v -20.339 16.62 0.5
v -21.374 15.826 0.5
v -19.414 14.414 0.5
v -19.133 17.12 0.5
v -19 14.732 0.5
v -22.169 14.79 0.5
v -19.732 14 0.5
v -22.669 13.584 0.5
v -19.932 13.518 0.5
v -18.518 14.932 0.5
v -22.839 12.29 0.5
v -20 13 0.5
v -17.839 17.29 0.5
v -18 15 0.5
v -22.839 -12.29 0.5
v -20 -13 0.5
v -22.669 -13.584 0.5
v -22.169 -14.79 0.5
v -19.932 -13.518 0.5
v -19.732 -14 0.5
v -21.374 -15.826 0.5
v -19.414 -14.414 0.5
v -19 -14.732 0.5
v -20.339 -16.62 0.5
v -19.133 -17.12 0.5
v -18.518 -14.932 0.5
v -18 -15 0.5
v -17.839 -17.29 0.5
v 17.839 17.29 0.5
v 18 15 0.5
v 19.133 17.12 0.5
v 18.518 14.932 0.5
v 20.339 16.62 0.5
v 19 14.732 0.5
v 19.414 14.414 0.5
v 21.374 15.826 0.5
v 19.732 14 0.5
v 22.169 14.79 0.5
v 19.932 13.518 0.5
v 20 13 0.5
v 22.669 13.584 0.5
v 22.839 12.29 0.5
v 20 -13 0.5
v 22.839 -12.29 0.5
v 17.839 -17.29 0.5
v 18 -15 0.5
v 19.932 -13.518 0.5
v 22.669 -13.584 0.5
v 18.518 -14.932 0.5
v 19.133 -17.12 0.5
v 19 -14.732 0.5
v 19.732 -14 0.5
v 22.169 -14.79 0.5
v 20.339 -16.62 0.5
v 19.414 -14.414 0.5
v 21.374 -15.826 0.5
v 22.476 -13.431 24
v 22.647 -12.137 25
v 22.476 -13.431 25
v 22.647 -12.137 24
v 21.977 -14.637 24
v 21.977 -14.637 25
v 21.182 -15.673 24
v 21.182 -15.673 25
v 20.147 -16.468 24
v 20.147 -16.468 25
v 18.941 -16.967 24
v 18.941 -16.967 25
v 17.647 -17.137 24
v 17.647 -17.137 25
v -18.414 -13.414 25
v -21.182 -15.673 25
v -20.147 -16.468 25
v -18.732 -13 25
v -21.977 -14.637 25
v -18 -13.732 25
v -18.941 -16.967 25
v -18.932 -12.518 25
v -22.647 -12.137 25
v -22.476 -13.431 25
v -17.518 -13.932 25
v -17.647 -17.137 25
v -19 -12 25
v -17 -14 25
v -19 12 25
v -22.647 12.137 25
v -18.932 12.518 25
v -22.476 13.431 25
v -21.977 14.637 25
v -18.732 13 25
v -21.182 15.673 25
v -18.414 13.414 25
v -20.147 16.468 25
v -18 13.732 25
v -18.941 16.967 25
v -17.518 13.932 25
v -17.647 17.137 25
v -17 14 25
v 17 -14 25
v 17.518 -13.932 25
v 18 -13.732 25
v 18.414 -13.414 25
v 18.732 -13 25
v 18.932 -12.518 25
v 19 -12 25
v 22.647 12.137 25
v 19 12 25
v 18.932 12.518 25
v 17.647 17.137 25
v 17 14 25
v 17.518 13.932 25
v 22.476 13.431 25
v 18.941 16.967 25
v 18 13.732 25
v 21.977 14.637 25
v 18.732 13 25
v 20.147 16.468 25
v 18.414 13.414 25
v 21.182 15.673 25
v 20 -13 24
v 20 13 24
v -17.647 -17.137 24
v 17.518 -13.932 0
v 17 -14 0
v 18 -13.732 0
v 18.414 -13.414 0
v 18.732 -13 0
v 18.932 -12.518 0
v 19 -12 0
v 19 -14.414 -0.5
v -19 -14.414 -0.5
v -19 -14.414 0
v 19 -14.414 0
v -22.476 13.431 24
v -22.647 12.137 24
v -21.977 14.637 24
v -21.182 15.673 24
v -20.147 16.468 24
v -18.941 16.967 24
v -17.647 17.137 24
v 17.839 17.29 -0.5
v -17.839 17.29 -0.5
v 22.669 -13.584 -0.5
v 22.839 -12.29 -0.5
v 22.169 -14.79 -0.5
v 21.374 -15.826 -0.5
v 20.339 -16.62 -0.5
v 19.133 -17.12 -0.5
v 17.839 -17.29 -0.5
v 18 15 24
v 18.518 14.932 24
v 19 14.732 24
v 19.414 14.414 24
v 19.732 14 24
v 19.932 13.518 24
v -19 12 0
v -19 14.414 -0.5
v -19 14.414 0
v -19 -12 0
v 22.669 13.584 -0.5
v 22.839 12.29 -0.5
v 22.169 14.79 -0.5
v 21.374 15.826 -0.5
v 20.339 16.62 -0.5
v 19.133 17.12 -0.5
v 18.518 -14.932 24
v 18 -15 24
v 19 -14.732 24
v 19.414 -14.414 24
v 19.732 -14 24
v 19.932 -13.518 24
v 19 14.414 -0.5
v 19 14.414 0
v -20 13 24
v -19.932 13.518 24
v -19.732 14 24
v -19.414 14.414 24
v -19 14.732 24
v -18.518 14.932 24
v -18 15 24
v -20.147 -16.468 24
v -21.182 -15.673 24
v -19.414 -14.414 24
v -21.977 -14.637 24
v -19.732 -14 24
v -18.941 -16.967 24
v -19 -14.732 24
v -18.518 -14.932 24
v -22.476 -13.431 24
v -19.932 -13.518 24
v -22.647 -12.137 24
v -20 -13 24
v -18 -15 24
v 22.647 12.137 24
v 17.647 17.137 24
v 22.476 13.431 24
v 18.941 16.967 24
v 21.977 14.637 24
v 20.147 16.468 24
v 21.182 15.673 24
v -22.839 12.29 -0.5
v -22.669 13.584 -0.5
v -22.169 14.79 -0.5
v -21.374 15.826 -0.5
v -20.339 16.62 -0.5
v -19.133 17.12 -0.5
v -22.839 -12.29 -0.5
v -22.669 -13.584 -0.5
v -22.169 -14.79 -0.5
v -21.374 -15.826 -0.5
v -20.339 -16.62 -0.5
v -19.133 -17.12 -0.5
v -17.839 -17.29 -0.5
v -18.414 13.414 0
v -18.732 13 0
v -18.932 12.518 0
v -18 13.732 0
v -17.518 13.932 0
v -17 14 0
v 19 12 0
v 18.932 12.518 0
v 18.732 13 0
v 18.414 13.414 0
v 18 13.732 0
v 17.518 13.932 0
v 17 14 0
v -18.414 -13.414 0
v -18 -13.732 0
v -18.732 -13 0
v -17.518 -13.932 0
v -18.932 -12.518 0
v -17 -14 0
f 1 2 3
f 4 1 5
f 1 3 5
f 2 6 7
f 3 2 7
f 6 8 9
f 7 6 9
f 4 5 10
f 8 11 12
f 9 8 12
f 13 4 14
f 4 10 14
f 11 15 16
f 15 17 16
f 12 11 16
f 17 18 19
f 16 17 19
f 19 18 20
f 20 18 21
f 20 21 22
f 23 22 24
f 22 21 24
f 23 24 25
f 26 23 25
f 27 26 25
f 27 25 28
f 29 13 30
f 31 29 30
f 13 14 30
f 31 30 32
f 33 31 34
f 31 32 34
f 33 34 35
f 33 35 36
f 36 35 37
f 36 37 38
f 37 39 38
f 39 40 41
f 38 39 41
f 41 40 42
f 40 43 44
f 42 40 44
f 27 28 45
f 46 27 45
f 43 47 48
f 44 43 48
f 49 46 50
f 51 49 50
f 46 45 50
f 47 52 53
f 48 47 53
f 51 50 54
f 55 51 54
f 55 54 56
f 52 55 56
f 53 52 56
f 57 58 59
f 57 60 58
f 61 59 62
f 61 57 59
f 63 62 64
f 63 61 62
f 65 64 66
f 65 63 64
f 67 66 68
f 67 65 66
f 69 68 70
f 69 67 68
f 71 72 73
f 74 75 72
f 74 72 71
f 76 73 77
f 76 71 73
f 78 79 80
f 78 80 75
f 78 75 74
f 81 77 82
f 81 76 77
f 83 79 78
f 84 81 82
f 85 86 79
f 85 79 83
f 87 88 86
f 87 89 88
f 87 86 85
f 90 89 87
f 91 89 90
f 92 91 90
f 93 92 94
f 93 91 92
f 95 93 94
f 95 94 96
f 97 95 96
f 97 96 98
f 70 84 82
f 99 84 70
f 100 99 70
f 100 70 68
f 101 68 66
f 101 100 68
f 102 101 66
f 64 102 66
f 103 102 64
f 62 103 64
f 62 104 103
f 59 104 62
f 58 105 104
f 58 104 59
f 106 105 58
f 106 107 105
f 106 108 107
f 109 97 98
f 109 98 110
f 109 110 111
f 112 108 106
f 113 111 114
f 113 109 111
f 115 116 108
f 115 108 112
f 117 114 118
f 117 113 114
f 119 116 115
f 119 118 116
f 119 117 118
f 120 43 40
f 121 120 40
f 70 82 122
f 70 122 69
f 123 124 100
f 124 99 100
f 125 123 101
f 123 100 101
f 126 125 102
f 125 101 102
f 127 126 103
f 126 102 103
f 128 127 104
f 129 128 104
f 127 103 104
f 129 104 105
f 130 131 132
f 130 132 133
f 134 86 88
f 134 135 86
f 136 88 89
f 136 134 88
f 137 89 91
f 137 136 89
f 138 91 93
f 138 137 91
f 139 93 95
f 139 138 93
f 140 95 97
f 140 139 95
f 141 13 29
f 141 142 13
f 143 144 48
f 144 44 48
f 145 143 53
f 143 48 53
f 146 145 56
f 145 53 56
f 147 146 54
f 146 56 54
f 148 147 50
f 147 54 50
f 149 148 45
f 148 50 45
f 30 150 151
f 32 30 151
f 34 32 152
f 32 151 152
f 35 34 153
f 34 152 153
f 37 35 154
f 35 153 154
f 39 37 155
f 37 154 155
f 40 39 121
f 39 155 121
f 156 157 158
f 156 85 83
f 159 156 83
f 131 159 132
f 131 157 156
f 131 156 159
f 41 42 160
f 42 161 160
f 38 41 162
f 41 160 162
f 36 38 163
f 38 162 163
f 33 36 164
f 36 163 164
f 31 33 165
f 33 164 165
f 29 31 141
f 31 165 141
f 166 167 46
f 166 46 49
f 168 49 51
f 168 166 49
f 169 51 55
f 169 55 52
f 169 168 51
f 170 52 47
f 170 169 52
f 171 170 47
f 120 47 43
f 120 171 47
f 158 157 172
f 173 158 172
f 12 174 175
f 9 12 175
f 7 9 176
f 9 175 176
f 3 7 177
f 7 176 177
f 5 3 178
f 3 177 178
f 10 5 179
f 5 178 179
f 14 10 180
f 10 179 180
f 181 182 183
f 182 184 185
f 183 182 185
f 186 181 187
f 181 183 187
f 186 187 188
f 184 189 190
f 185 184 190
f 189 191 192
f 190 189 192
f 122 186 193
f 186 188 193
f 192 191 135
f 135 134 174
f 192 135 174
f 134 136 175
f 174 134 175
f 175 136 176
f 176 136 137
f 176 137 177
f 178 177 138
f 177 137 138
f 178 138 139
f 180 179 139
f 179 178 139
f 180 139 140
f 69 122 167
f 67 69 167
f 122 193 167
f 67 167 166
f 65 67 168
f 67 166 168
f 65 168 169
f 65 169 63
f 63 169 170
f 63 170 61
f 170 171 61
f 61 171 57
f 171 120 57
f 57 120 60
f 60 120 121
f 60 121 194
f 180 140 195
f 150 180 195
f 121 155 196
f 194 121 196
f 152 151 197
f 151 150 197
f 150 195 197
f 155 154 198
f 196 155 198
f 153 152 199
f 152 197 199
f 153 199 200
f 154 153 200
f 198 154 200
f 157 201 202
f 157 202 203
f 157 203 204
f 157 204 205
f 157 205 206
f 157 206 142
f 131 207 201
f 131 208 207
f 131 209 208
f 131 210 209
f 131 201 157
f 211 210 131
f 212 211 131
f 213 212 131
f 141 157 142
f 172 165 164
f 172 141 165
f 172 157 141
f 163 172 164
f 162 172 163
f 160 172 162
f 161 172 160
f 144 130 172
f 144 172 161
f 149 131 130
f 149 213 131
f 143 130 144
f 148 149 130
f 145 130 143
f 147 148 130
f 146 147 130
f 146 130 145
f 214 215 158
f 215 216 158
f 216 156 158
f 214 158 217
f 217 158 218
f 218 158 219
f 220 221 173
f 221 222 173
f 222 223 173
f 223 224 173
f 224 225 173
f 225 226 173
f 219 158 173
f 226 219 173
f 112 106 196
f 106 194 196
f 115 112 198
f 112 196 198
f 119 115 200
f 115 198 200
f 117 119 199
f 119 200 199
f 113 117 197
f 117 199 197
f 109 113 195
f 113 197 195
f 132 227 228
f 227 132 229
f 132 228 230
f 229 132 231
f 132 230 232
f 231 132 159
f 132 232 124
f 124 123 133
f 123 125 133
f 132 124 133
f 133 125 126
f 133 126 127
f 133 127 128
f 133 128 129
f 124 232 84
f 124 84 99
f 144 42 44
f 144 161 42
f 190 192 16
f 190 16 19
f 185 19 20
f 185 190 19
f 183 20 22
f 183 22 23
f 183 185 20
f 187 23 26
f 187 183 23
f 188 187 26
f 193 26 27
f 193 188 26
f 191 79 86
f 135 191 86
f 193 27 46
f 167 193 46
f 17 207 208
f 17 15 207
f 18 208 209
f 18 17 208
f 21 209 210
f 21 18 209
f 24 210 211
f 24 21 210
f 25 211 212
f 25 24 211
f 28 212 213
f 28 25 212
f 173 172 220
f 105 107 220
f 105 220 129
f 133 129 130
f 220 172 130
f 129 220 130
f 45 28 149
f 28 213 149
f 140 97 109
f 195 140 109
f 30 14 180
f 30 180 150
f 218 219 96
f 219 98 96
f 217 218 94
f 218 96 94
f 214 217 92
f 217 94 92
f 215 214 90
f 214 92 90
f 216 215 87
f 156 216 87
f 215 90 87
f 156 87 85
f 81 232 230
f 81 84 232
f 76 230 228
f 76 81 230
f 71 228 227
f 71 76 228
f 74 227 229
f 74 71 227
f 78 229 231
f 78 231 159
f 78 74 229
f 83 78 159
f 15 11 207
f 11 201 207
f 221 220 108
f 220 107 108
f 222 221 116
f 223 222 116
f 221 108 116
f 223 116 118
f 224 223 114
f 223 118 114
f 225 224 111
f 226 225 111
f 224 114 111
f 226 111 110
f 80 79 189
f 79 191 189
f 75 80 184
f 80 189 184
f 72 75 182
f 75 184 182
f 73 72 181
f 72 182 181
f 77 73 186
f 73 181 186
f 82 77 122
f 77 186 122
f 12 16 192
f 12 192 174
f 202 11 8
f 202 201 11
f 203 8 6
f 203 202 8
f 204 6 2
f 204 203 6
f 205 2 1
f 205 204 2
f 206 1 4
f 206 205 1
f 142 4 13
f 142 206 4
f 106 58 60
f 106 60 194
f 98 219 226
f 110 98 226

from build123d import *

# Parameters (mm, degrees)
F0_W     = 40
F0_H     = 30
F0_W_2   = 38
F0_H_2   = 28
F1_DEPTH = 25
F2_R     = 2
F3_W     = 45.2934801579
F3_H     = 34.2747867107
F3_W_2   = 38.8284271247
F3_H_2   = 28.8284271247
F4_DEPTH = 1
F5_R     = 5
F6_W     = 45.6778518856
F6_H     = 34.5805324614
F6_W_2   = 38
F6_H_2   = 28.8284271247
F7_DEPTH = 0.5
F8_R     = 5


with BuildPart() as f1:
    # F0 (on Top) → F1 (new body)
    with BuildSketch(Plane.XY):
        Rectangle(F0_W, F0_H)
        Rectangle(F0_W_2, F0_H_2, mode=Mode.SUBTRACT)
    extrude(amount=F1_DEPTH)

    # F2
    f2_edges = [f1.edges().sort_by_distance(p)[0] for p in [
        (-19, -14, 12.5),
        (-20, -15, 12.5),
        (-20, 15, 12.5),
        (-19, 14, 12.5),
        (19, -14, 12.5),
        (19, 14, 12.5),
        (20, 15, 12.5),
        (20, -15, 12.5),
    ]]
    fillet(f2_edges, radius=F2_R)

    # F3 (on face) → F4 (join)
    with BuildSketch(Plane.XY.offset(25)):
        Rectangle(F3_W, F3_H)
        Rectangle(F3_W_2, F3_H_2, mode=Mode.SUBTRACT)
    extrude(amount=-F4_DEPTH)

    # F5
    f5_edges = [f1.edges().sort_by_distance(p)[0] for p in [
        (-22.64674, 17.137393, 24.5),
        (-22.64674, -17.137393, 24.5),
        (22.64674, 17.137393, 24.5),
        (22.64674, -17.137393, 24.5),
    ]]
    fillet(f5_edges, radius=F5_R)

    # F6 (on face) → F7 (join, symmetric)
    with BuildSketch(Plane(origin=(0, 0, 0), x_dir=(1, 0, 0), z_dir=(0, 0, -1))):
        Rectangle(F6_W, F6_H)
        Rectangle(F6_W_2, F6_H_2, mode=Mode.SUBTRACT)
    extrude(amount=F7_DEPTH, both=True)

    # F8
    f8_edges = [f1.edges().sort_by_distance(p)[0] for p in [
        (-22.838926, -17.290266, 0),
        (22.838926, -17.290266, 0),
        (-22.838926, 17.290266, 0),
        (22.838926, 17.290266, 0),
    ]]
    fillet(f8_edges, radius=F8_R)


solid = f1.part
